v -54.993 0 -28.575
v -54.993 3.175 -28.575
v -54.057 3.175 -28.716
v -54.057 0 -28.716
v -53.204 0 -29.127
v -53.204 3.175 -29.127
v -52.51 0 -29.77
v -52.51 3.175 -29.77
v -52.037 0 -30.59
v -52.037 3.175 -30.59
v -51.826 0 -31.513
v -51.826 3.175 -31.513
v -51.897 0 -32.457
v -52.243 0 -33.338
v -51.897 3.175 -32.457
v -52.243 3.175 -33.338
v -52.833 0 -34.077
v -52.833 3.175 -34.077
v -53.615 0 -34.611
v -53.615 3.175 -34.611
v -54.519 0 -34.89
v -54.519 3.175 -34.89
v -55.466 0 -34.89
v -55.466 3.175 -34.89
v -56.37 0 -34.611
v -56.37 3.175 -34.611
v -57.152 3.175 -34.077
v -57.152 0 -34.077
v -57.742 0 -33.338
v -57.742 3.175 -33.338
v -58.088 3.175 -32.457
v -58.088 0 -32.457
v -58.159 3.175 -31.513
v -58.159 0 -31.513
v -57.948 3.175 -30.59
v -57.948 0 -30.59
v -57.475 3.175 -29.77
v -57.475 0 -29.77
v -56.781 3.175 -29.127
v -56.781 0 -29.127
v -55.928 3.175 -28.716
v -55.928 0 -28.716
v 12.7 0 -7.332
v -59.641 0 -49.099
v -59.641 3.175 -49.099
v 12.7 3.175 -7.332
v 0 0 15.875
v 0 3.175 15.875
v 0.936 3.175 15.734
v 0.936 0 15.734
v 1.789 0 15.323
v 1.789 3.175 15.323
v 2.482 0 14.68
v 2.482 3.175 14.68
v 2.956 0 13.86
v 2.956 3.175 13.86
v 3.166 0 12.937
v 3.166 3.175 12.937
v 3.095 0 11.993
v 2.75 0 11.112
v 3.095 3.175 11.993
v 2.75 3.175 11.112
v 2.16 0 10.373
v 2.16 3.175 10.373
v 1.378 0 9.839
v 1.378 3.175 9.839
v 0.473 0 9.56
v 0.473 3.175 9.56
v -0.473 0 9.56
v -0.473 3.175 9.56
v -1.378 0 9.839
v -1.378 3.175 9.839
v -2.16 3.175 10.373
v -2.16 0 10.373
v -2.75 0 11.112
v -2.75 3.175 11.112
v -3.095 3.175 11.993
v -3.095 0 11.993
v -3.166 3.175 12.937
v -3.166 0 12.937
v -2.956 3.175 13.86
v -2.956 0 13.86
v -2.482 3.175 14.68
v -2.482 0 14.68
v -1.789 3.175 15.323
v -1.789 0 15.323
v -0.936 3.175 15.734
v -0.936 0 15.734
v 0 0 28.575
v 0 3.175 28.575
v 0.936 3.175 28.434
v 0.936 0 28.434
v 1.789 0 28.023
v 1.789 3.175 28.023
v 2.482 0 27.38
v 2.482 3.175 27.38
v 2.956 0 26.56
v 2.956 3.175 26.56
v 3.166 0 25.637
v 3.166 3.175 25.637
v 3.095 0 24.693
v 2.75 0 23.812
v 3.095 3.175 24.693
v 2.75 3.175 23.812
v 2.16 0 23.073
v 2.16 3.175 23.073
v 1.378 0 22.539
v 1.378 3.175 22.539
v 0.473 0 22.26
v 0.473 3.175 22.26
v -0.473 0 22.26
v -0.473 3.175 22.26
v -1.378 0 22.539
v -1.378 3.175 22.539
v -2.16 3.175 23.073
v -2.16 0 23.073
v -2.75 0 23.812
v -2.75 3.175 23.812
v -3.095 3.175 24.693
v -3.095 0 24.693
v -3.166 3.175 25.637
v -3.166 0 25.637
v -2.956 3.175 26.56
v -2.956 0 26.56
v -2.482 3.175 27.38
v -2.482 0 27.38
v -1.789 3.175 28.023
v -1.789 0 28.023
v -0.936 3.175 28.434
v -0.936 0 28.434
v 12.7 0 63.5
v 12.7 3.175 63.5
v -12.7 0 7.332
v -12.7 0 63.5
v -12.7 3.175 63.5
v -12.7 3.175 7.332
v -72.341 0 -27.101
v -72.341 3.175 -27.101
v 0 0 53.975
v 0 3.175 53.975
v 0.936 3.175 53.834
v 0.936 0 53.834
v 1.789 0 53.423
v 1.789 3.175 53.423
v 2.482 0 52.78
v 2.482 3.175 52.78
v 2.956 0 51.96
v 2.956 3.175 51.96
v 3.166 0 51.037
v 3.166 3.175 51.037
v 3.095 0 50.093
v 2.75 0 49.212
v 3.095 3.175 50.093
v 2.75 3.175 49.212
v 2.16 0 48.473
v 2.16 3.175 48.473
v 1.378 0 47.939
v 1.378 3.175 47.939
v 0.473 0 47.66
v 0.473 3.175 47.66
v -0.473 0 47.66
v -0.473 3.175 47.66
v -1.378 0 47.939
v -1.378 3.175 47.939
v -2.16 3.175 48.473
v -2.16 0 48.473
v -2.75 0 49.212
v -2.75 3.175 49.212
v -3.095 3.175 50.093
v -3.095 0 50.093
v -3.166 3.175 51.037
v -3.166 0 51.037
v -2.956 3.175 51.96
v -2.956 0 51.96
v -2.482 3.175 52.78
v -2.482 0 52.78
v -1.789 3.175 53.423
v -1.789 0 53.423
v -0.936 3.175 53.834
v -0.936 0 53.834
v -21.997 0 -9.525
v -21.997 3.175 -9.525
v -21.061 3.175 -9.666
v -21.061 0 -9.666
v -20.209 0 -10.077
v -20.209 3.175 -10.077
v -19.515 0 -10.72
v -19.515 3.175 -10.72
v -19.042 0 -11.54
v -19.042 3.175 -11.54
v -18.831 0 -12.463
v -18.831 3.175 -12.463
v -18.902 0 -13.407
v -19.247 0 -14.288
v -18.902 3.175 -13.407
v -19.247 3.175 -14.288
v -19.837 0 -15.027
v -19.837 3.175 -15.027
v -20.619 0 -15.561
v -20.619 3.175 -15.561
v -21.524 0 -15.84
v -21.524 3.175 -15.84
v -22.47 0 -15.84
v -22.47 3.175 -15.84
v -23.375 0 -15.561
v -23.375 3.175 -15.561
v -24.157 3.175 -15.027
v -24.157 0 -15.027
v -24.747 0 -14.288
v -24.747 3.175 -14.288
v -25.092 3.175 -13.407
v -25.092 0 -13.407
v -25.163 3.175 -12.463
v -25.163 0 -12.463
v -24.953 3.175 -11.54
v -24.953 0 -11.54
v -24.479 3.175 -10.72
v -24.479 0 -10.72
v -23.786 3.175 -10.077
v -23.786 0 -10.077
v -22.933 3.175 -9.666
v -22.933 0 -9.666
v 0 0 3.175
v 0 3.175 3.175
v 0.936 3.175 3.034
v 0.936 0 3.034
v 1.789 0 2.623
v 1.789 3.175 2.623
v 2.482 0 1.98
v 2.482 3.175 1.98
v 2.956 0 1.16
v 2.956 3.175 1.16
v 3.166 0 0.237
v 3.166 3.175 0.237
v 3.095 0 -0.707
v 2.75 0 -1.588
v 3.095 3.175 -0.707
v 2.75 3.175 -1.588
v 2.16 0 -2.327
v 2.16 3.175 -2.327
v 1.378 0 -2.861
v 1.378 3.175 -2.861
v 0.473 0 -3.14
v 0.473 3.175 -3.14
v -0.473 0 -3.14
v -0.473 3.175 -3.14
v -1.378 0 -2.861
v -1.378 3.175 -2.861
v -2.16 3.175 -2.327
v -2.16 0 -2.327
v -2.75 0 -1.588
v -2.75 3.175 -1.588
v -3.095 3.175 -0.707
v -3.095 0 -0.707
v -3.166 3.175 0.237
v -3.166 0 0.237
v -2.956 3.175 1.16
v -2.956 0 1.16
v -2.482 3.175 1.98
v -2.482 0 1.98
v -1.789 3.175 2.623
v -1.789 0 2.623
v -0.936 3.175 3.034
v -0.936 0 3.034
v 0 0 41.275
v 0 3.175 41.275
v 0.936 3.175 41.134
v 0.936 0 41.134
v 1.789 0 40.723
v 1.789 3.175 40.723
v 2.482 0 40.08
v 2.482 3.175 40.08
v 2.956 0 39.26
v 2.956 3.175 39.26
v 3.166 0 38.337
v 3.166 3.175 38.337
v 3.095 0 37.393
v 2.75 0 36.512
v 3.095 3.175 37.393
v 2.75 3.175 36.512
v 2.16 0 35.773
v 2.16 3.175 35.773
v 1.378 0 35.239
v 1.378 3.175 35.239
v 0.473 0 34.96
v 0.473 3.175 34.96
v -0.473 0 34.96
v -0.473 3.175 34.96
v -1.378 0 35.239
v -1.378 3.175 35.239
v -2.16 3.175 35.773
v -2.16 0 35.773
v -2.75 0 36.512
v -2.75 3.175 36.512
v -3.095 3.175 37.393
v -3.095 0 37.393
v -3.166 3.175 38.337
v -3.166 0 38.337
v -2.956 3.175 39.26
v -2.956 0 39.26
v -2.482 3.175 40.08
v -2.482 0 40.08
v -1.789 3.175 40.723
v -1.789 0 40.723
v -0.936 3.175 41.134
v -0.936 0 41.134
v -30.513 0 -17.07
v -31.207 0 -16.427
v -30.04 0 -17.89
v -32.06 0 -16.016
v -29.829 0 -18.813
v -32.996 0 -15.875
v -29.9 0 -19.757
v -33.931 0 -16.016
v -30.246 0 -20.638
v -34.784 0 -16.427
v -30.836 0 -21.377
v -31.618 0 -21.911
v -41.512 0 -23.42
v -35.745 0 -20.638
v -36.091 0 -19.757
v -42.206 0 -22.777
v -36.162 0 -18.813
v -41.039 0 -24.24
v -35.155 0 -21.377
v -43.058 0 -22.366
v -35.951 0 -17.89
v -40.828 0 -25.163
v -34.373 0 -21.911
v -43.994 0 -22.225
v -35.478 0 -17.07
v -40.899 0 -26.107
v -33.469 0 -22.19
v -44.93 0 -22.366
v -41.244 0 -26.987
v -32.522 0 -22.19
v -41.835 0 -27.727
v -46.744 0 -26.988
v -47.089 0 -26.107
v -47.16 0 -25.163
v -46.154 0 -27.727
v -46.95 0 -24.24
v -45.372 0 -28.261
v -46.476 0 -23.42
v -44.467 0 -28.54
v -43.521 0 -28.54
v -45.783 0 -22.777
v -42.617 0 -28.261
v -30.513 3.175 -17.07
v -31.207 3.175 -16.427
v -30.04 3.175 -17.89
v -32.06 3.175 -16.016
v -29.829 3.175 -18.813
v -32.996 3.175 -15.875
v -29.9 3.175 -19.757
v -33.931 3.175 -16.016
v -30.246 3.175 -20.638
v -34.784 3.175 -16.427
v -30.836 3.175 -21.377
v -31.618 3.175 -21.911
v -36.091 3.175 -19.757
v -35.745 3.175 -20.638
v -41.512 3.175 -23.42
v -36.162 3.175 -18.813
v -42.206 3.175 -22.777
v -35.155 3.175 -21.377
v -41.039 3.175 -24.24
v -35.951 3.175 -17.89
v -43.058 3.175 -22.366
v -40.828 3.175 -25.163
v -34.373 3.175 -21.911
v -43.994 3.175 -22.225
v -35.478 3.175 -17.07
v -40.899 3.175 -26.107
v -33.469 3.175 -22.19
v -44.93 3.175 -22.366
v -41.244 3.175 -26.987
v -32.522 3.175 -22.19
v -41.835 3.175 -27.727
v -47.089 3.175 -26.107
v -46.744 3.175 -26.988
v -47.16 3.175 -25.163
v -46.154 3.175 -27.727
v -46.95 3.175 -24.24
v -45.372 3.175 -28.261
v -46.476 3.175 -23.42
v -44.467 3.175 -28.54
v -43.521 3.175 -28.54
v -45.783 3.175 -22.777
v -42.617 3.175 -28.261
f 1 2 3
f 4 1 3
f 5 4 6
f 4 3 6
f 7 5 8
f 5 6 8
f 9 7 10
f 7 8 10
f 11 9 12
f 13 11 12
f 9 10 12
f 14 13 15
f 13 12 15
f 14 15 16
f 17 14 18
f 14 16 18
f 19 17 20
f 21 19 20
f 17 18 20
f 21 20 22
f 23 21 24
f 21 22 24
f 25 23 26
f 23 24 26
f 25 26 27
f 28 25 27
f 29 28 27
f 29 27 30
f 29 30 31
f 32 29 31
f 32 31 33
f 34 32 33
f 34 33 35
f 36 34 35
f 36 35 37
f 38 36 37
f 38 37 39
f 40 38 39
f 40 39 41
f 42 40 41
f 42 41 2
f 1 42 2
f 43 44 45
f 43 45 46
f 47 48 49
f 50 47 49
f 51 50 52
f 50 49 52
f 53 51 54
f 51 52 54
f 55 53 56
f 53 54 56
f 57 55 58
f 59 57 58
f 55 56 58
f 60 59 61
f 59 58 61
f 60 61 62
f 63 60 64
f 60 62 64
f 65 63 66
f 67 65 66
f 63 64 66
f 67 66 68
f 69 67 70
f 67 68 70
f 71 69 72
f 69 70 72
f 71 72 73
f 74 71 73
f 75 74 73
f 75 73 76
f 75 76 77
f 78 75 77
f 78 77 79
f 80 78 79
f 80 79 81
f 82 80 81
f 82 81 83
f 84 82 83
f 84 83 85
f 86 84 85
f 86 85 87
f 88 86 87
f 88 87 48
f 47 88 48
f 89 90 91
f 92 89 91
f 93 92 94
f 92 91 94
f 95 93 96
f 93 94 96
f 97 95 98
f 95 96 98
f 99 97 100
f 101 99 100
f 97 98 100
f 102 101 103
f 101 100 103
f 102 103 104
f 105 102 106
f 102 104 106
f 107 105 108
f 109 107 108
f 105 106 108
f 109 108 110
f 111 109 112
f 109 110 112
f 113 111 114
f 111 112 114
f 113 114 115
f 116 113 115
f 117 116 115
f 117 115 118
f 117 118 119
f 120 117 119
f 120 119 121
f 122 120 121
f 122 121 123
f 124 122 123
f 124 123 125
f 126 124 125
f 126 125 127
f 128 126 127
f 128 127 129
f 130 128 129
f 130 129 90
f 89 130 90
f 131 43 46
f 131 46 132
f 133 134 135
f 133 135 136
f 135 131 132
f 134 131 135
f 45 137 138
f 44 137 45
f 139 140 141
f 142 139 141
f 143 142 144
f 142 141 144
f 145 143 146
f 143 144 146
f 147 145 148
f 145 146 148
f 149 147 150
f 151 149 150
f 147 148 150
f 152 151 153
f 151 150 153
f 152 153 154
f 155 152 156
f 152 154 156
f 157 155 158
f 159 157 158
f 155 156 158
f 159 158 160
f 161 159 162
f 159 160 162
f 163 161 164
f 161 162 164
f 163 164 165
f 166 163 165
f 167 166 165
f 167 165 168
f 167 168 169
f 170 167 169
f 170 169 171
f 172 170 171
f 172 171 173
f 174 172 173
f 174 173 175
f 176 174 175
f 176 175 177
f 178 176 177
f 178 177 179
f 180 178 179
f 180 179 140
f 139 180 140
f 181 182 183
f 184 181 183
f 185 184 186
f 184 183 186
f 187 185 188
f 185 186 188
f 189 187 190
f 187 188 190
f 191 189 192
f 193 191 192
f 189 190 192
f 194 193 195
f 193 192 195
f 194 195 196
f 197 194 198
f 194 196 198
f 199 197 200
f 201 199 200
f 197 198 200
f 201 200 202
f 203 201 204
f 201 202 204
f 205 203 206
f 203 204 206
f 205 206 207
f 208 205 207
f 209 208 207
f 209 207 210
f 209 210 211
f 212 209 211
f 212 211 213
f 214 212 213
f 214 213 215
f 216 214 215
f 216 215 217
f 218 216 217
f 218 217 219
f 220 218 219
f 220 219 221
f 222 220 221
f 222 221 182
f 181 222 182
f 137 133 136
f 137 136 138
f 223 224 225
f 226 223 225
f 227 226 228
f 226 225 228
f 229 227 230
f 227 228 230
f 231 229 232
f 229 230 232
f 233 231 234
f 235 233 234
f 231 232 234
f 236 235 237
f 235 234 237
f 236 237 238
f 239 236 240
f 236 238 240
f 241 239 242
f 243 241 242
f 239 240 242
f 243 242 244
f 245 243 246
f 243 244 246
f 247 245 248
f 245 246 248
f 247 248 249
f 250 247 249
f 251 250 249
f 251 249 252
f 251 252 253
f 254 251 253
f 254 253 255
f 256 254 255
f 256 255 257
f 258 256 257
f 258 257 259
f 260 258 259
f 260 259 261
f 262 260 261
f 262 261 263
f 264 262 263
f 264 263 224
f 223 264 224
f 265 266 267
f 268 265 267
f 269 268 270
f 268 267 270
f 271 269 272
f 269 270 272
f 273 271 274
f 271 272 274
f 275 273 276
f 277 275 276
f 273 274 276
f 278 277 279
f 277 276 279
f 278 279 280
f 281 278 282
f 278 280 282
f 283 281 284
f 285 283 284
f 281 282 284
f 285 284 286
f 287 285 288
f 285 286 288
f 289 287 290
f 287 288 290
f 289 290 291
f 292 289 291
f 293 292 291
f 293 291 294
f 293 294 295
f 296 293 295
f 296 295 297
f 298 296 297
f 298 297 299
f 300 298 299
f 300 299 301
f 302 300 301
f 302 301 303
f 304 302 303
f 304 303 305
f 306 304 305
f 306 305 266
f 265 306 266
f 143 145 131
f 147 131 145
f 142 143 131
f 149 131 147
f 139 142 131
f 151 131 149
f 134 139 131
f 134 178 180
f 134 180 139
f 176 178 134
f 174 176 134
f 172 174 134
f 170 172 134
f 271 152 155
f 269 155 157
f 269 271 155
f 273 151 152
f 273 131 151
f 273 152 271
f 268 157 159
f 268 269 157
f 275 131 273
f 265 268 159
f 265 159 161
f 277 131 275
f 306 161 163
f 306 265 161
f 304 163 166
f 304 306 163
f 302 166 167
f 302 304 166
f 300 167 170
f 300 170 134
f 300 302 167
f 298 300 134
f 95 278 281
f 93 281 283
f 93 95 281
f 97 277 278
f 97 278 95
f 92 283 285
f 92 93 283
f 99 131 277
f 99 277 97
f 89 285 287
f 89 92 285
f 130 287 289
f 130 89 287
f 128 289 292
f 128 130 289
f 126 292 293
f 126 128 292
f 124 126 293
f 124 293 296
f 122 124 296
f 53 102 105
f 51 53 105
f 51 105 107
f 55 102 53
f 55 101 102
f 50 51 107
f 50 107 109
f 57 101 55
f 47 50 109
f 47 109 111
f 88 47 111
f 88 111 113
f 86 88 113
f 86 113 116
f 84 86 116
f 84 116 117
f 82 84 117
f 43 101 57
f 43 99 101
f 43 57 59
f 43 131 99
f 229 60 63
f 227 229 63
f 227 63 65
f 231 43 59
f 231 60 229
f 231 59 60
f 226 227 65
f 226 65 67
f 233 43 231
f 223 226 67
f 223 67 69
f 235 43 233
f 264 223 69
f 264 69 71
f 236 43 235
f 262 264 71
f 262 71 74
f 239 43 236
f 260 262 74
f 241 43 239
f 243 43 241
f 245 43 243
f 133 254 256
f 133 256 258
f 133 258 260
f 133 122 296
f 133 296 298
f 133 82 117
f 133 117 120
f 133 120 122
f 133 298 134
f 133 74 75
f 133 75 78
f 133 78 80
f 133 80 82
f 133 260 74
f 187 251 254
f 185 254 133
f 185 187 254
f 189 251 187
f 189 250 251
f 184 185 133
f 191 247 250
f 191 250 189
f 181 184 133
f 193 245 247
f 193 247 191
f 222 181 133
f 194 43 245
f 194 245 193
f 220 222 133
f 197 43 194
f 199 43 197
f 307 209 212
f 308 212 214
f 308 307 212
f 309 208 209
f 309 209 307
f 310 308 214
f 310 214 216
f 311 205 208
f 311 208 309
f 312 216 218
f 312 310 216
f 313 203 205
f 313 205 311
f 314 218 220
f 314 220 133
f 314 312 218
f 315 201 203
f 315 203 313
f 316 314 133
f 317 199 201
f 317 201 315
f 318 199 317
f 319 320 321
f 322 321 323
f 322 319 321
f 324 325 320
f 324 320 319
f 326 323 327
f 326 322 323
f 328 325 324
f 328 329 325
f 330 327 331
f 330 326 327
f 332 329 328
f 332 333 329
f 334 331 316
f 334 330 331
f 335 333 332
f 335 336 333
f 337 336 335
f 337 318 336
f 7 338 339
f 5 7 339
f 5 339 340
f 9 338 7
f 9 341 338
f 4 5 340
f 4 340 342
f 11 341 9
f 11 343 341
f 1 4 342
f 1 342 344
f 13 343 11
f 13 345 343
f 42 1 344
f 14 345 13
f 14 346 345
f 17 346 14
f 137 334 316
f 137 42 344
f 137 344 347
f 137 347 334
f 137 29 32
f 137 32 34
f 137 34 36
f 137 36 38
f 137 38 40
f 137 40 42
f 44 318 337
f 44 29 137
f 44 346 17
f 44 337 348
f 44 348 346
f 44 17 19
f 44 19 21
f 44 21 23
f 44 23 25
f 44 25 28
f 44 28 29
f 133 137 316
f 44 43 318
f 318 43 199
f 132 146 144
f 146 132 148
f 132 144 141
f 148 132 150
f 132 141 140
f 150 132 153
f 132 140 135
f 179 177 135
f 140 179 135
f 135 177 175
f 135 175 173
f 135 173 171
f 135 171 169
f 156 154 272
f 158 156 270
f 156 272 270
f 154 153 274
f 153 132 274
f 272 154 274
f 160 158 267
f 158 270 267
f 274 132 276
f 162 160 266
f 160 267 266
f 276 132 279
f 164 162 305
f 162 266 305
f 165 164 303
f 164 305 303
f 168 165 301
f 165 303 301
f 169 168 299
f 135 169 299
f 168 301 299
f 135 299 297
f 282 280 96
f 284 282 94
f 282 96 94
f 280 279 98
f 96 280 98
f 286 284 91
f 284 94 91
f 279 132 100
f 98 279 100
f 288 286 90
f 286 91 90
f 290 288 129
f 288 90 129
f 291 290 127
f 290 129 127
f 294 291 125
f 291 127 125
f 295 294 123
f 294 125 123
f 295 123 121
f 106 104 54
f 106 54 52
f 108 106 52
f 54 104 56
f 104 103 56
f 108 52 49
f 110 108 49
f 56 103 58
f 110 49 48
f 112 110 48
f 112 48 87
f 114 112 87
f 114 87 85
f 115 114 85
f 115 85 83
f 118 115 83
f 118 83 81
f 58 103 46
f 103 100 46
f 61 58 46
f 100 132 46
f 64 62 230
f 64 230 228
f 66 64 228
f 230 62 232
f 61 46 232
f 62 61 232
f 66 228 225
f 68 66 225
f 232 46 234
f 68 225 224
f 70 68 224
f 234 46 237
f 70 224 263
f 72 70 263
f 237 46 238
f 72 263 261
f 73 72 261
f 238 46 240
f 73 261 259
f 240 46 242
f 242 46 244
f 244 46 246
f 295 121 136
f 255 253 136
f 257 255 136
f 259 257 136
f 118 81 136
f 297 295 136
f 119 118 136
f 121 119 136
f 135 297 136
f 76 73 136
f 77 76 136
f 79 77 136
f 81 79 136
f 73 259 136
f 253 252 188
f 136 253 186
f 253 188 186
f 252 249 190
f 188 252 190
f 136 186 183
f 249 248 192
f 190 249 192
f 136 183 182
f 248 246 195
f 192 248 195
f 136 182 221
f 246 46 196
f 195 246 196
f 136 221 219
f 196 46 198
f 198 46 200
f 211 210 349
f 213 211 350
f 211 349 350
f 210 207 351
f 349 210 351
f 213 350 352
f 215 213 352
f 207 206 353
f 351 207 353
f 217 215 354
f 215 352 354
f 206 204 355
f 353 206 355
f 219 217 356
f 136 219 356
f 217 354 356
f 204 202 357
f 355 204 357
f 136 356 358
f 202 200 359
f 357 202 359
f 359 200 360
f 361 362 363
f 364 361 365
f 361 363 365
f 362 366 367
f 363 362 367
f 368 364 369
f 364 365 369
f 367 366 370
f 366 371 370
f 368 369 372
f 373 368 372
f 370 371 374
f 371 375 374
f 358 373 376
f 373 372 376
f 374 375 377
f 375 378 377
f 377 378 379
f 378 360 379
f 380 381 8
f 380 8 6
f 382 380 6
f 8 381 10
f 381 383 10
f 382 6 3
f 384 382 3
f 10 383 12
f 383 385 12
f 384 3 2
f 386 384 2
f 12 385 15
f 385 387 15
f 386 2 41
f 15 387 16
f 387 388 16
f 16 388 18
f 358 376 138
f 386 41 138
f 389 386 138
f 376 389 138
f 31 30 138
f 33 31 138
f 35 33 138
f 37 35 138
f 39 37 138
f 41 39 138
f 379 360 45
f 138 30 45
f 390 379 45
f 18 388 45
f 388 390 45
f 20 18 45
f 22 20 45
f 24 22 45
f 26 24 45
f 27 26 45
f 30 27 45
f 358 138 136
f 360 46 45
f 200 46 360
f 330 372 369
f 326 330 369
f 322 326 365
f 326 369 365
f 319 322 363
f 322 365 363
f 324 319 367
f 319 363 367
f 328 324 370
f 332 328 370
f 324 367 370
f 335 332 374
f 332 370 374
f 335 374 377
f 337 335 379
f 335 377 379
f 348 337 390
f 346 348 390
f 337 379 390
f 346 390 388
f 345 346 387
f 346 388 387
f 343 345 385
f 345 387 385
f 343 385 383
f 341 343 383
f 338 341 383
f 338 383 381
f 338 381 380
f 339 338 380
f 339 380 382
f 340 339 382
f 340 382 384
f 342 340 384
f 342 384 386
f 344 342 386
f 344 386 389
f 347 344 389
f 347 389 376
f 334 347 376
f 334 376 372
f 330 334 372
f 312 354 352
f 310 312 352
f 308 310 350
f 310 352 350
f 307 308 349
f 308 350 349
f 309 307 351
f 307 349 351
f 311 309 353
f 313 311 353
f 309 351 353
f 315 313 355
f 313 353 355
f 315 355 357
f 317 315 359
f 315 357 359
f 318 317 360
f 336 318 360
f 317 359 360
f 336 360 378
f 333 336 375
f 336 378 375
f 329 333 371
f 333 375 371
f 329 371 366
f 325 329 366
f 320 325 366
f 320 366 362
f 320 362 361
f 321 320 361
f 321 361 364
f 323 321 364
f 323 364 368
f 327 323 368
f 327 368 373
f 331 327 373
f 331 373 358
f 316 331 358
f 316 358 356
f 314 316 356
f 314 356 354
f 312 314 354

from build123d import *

# Parameters (mm, degrees)
BOSS_EXTRUDE1_DEPTH = 3.175
SKETCH2_R           = 3.175
CUT_EXTRUDE1_DEPTH  = 97.30976352


with BuildPart() as part:
    # Sketch1 → Boss-Extrude1 (new body)
    with BuildSketch(Plane(origin=(0, 0, 0), x_dir=(1, 0, 0), z_dir=(0, 1, 0))):
        Polygon((12.7, 7.332348419), (12.7, -63.5), (-12.7, -63.5), (-12.7, -7.332348419), (-72.341135768, 27.101477372), (-59.641135768, 49.098522628), align=None)
    extrude(amount=BOSS_EXTRUDE1_DEPTH)

    # Sketch2 → Cut-Extrude1 (cut, through all)
    with BuildSketch(Plane(origin=(0, 3.175, 0), x_dir=(1, 0, 0), z_dir=(0, 1, 0))):
        with Locations(Location((-54.99261314, 31.75, 0), (0, 0, 270))):
            Circle(SKETCH2_R)
        with Locations(Location((-43.994090512, 25.4, 0), (0, 0, 270))):
            Circle(SKETCH2_R)
        with Locations(Location((-32.995567884, 19.05, 0), (0, 0, 270))):
            Circle(SKETCH2_R)
        with Locations(Location((-21.997045256, 12.7, 0), (0, 0, 270))):
            Circle(SKETCH2_R)
        with Locations(Location((0, 0, 0), (0, 0, 270))):
            Circle(SKETCH2_R)
        with Locations(Location((0, -50.8, 0), (0, 0, 270))):
            Circle(SKETCH2_R)
        with Locations(Location((0, -38.1, 0), (0, 0, 270))):
            Circle(SKETCH2_R)
        with Locations(Location((0, -25.4, 0), (0, 0, 270))):
            Circle(SKETCH2_R)
        with Locations(Location((0, -12.7, 0), (0, 0, 270))):
            Circle(SKETCH2_R)
    extrude(amount=-CUT_EXTRUDE1_DEPTH, mode=Mode.SUBTRACT)


solid = part.part
